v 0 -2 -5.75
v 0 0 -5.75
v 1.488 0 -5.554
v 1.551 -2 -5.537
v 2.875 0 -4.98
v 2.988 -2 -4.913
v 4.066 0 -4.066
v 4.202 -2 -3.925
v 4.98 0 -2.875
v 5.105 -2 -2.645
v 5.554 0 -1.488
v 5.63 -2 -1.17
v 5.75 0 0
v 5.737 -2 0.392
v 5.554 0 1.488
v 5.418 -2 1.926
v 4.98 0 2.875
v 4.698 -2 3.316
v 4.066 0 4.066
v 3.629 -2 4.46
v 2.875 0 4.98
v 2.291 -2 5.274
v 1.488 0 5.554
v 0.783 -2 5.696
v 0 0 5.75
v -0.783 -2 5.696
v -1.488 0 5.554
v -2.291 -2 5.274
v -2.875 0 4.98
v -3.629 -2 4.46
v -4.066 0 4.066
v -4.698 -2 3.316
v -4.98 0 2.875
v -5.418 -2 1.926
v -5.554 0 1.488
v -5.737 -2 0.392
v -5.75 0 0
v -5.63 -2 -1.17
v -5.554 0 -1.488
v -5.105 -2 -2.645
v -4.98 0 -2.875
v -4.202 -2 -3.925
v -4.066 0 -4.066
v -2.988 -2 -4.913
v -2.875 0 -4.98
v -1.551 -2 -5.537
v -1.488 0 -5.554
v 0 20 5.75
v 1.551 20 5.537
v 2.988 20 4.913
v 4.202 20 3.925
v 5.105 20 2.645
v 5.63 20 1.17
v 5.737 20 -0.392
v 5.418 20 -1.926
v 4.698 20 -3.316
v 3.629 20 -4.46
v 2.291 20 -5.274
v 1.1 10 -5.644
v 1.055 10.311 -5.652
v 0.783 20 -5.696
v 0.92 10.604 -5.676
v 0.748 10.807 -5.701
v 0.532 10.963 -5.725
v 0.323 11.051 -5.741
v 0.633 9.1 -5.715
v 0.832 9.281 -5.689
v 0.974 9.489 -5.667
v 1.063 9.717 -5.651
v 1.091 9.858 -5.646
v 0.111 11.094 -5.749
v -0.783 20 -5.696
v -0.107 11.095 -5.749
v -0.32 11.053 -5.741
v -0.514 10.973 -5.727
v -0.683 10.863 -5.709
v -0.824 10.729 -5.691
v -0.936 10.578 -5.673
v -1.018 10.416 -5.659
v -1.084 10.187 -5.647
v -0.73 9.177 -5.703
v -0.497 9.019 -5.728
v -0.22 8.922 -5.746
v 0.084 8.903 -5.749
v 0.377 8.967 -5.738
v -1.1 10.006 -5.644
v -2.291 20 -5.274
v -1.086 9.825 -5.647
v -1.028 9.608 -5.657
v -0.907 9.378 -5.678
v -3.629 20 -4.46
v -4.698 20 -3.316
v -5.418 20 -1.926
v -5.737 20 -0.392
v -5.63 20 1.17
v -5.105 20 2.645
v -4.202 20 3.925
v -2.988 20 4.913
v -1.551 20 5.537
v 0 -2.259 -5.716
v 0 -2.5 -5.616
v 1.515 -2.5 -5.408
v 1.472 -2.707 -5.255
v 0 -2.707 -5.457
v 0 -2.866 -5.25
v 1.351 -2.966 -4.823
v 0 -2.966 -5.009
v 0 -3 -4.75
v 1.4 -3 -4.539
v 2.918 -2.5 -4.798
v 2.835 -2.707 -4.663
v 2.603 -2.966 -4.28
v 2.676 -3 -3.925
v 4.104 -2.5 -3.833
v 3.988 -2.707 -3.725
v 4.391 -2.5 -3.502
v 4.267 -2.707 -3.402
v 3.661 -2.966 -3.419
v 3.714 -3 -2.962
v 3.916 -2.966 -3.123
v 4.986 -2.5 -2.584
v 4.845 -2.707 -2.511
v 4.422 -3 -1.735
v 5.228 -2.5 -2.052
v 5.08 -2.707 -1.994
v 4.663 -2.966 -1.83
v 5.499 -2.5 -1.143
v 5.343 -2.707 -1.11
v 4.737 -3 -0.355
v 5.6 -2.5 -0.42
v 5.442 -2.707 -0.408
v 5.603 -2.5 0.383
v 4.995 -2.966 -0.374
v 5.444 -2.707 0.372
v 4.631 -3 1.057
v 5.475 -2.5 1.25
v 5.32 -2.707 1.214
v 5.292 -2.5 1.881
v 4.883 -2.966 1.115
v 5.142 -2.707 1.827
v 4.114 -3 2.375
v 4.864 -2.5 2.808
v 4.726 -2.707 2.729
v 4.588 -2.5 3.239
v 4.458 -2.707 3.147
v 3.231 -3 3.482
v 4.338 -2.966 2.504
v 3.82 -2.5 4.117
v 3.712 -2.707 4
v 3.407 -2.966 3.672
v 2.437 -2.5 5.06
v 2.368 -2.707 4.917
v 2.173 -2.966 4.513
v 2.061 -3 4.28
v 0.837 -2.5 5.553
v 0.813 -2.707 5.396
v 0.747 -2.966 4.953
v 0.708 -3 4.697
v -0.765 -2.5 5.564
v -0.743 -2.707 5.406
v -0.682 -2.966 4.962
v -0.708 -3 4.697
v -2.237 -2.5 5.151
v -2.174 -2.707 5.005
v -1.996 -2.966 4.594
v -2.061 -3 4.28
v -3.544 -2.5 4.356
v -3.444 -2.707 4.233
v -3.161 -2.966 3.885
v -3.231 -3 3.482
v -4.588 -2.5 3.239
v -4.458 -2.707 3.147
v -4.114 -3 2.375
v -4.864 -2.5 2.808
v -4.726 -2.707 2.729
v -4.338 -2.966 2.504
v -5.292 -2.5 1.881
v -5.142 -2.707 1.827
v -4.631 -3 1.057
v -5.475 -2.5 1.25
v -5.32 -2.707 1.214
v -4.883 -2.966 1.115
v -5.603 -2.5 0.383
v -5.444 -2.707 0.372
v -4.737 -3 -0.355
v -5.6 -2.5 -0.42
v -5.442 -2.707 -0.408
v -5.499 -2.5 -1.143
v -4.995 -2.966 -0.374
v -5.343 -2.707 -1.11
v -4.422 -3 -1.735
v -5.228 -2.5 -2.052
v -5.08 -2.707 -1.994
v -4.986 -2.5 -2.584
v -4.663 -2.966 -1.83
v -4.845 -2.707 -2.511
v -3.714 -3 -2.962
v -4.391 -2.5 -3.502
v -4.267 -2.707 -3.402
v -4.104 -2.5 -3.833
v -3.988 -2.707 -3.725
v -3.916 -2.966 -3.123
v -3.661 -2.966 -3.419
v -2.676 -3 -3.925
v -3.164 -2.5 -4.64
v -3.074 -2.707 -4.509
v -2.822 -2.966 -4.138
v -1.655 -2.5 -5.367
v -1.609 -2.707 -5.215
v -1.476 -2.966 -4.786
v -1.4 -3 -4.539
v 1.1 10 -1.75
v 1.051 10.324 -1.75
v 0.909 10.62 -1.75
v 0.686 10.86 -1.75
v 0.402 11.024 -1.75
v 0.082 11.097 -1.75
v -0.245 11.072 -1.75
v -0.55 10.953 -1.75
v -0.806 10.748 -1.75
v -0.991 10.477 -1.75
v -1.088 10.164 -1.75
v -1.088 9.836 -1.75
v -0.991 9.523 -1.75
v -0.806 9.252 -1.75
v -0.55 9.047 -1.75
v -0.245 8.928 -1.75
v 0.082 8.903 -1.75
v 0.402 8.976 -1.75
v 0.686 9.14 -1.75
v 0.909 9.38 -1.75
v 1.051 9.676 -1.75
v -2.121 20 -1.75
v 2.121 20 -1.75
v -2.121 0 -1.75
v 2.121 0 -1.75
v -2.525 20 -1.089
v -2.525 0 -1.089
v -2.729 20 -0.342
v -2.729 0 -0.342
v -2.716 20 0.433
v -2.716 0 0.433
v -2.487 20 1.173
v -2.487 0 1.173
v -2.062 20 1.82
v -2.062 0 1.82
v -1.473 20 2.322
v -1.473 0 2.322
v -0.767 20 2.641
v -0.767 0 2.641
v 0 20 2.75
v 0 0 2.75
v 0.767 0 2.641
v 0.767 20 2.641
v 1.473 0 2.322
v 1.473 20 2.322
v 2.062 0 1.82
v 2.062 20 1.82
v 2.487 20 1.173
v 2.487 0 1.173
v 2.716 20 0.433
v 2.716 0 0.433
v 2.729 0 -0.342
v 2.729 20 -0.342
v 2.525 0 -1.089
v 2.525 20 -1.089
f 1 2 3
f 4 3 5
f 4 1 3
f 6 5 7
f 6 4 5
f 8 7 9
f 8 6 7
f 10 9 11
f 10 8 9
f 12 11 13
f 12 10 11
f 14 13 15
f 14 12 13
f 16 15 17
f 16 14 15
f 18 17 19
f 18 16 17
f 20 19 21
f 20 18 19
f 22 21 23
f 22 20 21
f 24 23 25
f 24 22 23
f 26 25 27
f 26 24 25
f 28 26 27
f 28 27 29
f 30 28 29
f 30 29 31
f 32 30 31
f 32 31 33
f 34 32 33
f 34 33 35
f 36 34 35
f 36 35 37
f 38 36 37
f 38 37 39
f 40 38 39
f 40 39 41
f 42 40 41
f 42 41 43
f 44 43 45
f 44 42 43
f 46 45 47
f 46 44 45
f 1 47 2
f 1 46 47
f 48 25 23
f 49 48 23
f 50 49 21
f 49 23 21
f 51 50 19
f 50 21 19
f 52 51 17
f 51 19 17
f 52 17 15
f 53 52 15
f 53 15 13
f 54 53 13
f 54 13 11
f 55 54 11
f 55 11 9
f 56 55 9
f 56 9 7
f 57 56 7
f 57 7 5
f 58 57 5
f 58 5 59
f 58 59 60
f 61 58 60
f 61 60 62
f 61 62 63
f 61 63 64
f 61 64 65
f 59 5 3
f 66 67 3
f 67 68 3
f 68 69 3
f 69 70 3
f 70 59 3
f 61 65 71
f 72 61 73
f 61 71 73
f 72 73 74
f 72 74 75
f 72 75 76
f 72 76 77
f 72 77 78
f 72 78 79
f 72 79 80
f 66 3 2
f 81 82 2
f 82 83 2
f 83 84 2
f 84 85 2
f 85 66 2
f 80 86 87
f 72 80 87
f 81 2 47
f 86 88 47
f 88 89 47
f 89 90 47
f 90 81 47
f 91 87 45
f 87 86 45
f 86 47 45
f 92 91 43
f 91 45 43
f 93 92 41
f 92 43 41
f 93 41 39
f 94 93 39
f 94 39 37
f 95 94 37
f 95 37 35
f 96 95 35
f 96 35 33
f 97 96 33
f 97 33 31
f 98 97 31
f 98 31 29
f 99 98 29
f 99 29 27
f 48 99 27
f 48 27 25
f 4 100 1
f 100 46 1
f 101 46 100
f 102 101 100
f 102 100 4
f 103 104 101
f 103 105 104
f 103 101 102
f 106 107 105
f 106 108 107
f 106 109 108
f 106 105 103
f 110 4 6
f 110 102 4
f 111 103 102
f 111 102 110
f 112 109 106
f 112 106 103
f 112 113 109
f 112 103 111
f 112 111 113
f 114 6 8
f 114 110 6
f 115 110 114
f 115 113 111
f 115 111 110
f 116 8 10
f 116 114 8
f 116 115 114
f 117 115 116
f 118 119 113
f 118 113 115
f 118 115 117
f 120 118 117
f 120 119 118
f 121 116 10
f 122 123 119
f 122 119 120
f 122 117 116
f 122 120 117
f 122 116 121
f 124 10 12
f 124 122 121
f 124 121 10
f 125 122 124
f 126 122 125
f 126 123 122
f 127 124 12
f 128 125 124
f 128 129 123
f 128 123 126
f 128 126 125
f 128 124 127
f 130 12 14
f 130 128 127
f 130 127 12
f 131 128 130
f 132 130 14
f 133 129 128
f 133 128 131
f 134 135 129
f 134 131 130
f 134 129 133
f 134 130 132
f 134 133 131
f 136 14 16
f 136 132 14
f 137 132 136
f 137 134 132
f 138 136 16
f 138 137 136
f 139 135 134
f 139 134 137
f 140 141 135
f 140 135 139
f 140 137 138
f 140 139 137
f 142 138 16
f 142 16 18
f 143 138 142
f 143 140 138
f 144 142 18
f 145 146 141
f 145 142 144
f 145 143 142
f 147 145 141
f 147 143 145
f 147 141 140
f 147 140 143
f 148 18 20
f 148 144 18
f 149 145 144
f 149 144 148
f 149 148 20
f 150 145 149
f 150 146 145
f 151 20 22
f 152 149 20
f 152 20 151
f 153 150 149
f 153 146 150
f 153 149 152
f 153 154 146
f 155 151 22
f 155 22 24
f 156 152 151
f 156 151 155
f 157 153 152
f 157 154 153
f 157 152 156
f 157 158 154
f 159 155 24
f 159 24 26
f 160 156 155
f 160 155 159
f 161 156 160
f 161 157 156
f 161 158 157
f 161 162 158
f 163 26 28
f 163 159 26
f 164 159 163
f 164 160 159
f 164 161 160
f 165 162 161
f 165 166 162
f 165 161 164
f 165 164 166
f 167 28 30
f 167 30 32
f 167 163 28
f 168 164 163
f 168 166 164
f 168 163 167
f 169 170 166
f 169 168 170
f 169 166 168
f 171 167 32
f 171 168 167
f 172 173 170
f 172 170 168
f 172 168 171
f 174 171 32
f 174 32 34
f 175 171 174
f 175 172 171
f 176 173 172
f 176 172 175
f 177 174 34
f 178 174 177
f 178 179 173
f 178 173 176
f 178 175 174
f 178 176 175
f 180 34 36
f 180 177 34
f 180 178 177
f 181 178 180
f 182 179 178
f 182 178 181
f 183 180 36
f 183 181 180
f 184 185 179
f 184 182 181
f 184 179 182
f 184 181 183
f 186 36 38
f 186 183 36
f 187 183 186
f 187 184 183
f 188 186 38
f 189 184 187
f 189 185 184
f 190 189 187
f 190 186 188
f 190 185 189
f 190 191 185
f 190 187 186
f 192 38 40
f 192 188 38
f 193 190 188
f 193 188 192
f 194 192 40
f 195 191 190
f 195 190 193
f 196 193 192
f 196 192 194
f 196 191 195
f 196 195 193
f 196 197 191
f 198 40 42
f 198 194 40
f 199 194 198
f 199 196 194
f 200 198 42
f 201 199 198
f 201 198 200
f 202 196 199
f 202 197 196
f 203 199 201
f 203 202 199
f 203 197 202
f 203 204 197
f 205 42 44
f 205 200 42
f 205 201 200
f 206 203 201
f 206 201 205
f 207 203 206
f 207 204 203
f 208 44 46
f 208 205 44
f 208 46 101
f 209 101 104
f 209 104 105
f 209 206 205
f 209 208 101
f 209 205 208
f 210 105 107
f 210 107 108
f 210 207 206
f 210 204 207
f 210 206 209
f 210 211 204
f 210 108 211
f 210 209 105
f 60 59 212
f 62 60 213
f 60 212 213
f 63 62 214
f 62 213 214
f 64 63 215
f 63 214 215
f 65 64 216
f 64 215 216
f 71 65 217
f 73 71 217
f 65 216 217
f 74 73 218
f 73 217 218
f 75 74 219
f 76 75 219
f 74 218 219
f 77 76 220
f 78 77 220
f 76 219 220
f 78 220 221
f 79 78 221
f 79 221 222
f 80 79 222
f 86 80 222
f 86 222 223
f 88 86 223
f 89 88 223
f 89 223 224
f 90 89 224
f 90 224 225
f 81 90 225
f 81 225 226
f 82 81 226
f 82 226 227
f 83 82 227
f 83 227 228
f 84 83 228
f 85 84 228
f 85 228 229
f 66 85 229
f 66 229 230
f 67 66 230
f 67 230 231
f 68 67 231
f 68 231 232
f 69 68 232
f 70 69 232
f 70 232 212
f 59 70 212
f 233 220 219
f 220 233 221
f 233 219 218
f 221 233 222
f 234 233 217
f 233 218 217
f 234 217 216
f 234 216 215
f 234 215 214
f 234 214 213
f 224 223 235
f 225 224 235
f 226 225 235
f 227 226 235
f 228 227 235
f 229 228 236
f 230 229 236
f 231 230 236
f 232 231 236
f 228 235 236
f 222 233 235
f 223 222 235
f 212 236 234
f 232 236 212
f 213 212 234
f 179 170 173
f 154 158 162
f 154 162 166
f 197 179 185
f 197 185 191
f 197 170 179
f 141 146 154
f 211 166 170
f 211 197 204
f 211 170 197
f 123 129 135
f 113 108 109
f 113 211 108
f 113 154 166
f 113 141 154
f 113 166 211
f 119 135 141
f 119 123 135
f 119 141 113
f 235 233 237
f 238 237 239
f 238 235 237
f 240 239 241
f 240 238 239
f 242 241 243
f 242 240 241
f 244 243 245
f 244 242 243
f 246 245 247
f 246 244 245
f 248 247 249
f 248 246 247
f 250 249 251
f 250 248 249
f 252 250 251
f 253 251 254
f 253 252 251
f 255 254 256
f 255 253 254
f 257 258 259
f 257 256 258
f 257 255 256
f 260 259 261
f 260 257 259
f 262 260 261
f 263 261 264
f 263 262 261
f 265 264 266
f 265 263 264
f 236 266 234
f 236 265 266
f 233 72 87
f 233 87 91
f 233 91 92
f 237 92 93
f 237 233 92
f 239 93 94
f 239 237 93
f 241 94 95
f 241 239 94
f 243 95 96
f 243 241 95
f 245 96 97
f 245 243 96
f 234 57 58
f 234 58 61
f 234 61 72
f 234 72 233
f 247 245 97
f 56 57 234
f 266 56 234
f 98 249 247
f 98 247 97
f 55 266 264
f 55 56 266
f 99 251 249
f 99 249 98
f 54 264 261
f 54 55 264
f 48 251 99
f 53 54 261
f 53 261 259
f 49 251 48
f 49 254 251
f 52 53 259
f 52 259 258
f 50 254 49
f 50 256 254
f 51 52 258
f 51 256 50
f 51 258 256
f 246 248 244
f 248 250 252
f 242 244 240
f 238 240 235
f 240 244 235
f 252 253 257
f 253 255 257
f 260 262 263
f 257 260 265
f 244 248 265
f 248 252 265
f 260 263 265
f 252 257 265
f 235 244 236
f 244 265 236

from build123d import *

# Parameters (mm, degrees)
SKETCH1_R           = 5.75
SKETCH1_R_2         = 2.75
BOSS_EXTRUDE1_DEPTH = 20
BOSS_EXTRUDE3_START = -20
BOSS_EXTRUDE3_DEPTH = 20
SKETCH2_R           = 1.1
CUT_EXTRUDE1_DEPTH  = 22.589928207
BOSS_EXTRUDE2_START = 3
SKETCH3_R           = 5.75
BOSS_EXTRUDE2_DEPTH = 3
FILLET1_R           = 1


with BuildPart() as part:
    # Sketch1 → Boss-Extrude1 (new body)
    with BuildSketch(Plane(origin=(0, 0, 0), x_dir=(1, 0, 0), z_dir=(0, 1, 0))):
        with Locations(Location((0, 0, 0), (0, 0, 270))):
            Circle(SKETCH1_R)
        with Locations(Location((0, 0, 0), (0, 0, 270))):
            Circle(SKETCH1_R_2, mode=Mode.SUBTRACT)
    extrude(amount=BOSS_EXTRUDE1_DEPTH)

    # Sketch5 → Boss-Extrude3 (add)
    with BuildSketch(Plane(origin=(0, 20, 0), x_dir=(1, 0, 0), z_dir=(0, 1, 0)).offset(BOSS_EXTRUDE3_START)):
        with BuildLine():
            Line((-2.121320344, 1.75), (2.121320344, 1.75))
            ThreePointArc((2.121320344, 1.75), (0, 2.75), (-2.121320344, 1.75))
        make_face()
    extrude(amount=BOSS_EXTRUDE3_DEPTH)

    # Sketch2 → Cut-Extrude1 (cut, through all)
    with BuildSketch(Plane.XY):
        with Locations((0, 10)):
            Circle(SKETCH2_R)
    extrude(amount=-CUT_EXTRUDE1_DEPTH, mode=Mode.SUBTRACT)

    # Sketch3 → Boss-Extrude2 (add)
    with BuildSketch(Plane.XZ.offset(BOSS_EXTRUDE2_START)):
        with Locations(Location((0, 0, 0), (0, 0, 270))):
            Circle(SKETCH3_R)
    extrude(amount=-BOSS_EXTRUDE2_DEPTH)

    # Fillet1
    fillet1_edges = [part.edges().sort_by_distance(p)[0] for p in [
        (0, -3, 5.75),
    ]]
    fillet(fillet1_edges, radius=FILLET1_R)


solid = part.part
